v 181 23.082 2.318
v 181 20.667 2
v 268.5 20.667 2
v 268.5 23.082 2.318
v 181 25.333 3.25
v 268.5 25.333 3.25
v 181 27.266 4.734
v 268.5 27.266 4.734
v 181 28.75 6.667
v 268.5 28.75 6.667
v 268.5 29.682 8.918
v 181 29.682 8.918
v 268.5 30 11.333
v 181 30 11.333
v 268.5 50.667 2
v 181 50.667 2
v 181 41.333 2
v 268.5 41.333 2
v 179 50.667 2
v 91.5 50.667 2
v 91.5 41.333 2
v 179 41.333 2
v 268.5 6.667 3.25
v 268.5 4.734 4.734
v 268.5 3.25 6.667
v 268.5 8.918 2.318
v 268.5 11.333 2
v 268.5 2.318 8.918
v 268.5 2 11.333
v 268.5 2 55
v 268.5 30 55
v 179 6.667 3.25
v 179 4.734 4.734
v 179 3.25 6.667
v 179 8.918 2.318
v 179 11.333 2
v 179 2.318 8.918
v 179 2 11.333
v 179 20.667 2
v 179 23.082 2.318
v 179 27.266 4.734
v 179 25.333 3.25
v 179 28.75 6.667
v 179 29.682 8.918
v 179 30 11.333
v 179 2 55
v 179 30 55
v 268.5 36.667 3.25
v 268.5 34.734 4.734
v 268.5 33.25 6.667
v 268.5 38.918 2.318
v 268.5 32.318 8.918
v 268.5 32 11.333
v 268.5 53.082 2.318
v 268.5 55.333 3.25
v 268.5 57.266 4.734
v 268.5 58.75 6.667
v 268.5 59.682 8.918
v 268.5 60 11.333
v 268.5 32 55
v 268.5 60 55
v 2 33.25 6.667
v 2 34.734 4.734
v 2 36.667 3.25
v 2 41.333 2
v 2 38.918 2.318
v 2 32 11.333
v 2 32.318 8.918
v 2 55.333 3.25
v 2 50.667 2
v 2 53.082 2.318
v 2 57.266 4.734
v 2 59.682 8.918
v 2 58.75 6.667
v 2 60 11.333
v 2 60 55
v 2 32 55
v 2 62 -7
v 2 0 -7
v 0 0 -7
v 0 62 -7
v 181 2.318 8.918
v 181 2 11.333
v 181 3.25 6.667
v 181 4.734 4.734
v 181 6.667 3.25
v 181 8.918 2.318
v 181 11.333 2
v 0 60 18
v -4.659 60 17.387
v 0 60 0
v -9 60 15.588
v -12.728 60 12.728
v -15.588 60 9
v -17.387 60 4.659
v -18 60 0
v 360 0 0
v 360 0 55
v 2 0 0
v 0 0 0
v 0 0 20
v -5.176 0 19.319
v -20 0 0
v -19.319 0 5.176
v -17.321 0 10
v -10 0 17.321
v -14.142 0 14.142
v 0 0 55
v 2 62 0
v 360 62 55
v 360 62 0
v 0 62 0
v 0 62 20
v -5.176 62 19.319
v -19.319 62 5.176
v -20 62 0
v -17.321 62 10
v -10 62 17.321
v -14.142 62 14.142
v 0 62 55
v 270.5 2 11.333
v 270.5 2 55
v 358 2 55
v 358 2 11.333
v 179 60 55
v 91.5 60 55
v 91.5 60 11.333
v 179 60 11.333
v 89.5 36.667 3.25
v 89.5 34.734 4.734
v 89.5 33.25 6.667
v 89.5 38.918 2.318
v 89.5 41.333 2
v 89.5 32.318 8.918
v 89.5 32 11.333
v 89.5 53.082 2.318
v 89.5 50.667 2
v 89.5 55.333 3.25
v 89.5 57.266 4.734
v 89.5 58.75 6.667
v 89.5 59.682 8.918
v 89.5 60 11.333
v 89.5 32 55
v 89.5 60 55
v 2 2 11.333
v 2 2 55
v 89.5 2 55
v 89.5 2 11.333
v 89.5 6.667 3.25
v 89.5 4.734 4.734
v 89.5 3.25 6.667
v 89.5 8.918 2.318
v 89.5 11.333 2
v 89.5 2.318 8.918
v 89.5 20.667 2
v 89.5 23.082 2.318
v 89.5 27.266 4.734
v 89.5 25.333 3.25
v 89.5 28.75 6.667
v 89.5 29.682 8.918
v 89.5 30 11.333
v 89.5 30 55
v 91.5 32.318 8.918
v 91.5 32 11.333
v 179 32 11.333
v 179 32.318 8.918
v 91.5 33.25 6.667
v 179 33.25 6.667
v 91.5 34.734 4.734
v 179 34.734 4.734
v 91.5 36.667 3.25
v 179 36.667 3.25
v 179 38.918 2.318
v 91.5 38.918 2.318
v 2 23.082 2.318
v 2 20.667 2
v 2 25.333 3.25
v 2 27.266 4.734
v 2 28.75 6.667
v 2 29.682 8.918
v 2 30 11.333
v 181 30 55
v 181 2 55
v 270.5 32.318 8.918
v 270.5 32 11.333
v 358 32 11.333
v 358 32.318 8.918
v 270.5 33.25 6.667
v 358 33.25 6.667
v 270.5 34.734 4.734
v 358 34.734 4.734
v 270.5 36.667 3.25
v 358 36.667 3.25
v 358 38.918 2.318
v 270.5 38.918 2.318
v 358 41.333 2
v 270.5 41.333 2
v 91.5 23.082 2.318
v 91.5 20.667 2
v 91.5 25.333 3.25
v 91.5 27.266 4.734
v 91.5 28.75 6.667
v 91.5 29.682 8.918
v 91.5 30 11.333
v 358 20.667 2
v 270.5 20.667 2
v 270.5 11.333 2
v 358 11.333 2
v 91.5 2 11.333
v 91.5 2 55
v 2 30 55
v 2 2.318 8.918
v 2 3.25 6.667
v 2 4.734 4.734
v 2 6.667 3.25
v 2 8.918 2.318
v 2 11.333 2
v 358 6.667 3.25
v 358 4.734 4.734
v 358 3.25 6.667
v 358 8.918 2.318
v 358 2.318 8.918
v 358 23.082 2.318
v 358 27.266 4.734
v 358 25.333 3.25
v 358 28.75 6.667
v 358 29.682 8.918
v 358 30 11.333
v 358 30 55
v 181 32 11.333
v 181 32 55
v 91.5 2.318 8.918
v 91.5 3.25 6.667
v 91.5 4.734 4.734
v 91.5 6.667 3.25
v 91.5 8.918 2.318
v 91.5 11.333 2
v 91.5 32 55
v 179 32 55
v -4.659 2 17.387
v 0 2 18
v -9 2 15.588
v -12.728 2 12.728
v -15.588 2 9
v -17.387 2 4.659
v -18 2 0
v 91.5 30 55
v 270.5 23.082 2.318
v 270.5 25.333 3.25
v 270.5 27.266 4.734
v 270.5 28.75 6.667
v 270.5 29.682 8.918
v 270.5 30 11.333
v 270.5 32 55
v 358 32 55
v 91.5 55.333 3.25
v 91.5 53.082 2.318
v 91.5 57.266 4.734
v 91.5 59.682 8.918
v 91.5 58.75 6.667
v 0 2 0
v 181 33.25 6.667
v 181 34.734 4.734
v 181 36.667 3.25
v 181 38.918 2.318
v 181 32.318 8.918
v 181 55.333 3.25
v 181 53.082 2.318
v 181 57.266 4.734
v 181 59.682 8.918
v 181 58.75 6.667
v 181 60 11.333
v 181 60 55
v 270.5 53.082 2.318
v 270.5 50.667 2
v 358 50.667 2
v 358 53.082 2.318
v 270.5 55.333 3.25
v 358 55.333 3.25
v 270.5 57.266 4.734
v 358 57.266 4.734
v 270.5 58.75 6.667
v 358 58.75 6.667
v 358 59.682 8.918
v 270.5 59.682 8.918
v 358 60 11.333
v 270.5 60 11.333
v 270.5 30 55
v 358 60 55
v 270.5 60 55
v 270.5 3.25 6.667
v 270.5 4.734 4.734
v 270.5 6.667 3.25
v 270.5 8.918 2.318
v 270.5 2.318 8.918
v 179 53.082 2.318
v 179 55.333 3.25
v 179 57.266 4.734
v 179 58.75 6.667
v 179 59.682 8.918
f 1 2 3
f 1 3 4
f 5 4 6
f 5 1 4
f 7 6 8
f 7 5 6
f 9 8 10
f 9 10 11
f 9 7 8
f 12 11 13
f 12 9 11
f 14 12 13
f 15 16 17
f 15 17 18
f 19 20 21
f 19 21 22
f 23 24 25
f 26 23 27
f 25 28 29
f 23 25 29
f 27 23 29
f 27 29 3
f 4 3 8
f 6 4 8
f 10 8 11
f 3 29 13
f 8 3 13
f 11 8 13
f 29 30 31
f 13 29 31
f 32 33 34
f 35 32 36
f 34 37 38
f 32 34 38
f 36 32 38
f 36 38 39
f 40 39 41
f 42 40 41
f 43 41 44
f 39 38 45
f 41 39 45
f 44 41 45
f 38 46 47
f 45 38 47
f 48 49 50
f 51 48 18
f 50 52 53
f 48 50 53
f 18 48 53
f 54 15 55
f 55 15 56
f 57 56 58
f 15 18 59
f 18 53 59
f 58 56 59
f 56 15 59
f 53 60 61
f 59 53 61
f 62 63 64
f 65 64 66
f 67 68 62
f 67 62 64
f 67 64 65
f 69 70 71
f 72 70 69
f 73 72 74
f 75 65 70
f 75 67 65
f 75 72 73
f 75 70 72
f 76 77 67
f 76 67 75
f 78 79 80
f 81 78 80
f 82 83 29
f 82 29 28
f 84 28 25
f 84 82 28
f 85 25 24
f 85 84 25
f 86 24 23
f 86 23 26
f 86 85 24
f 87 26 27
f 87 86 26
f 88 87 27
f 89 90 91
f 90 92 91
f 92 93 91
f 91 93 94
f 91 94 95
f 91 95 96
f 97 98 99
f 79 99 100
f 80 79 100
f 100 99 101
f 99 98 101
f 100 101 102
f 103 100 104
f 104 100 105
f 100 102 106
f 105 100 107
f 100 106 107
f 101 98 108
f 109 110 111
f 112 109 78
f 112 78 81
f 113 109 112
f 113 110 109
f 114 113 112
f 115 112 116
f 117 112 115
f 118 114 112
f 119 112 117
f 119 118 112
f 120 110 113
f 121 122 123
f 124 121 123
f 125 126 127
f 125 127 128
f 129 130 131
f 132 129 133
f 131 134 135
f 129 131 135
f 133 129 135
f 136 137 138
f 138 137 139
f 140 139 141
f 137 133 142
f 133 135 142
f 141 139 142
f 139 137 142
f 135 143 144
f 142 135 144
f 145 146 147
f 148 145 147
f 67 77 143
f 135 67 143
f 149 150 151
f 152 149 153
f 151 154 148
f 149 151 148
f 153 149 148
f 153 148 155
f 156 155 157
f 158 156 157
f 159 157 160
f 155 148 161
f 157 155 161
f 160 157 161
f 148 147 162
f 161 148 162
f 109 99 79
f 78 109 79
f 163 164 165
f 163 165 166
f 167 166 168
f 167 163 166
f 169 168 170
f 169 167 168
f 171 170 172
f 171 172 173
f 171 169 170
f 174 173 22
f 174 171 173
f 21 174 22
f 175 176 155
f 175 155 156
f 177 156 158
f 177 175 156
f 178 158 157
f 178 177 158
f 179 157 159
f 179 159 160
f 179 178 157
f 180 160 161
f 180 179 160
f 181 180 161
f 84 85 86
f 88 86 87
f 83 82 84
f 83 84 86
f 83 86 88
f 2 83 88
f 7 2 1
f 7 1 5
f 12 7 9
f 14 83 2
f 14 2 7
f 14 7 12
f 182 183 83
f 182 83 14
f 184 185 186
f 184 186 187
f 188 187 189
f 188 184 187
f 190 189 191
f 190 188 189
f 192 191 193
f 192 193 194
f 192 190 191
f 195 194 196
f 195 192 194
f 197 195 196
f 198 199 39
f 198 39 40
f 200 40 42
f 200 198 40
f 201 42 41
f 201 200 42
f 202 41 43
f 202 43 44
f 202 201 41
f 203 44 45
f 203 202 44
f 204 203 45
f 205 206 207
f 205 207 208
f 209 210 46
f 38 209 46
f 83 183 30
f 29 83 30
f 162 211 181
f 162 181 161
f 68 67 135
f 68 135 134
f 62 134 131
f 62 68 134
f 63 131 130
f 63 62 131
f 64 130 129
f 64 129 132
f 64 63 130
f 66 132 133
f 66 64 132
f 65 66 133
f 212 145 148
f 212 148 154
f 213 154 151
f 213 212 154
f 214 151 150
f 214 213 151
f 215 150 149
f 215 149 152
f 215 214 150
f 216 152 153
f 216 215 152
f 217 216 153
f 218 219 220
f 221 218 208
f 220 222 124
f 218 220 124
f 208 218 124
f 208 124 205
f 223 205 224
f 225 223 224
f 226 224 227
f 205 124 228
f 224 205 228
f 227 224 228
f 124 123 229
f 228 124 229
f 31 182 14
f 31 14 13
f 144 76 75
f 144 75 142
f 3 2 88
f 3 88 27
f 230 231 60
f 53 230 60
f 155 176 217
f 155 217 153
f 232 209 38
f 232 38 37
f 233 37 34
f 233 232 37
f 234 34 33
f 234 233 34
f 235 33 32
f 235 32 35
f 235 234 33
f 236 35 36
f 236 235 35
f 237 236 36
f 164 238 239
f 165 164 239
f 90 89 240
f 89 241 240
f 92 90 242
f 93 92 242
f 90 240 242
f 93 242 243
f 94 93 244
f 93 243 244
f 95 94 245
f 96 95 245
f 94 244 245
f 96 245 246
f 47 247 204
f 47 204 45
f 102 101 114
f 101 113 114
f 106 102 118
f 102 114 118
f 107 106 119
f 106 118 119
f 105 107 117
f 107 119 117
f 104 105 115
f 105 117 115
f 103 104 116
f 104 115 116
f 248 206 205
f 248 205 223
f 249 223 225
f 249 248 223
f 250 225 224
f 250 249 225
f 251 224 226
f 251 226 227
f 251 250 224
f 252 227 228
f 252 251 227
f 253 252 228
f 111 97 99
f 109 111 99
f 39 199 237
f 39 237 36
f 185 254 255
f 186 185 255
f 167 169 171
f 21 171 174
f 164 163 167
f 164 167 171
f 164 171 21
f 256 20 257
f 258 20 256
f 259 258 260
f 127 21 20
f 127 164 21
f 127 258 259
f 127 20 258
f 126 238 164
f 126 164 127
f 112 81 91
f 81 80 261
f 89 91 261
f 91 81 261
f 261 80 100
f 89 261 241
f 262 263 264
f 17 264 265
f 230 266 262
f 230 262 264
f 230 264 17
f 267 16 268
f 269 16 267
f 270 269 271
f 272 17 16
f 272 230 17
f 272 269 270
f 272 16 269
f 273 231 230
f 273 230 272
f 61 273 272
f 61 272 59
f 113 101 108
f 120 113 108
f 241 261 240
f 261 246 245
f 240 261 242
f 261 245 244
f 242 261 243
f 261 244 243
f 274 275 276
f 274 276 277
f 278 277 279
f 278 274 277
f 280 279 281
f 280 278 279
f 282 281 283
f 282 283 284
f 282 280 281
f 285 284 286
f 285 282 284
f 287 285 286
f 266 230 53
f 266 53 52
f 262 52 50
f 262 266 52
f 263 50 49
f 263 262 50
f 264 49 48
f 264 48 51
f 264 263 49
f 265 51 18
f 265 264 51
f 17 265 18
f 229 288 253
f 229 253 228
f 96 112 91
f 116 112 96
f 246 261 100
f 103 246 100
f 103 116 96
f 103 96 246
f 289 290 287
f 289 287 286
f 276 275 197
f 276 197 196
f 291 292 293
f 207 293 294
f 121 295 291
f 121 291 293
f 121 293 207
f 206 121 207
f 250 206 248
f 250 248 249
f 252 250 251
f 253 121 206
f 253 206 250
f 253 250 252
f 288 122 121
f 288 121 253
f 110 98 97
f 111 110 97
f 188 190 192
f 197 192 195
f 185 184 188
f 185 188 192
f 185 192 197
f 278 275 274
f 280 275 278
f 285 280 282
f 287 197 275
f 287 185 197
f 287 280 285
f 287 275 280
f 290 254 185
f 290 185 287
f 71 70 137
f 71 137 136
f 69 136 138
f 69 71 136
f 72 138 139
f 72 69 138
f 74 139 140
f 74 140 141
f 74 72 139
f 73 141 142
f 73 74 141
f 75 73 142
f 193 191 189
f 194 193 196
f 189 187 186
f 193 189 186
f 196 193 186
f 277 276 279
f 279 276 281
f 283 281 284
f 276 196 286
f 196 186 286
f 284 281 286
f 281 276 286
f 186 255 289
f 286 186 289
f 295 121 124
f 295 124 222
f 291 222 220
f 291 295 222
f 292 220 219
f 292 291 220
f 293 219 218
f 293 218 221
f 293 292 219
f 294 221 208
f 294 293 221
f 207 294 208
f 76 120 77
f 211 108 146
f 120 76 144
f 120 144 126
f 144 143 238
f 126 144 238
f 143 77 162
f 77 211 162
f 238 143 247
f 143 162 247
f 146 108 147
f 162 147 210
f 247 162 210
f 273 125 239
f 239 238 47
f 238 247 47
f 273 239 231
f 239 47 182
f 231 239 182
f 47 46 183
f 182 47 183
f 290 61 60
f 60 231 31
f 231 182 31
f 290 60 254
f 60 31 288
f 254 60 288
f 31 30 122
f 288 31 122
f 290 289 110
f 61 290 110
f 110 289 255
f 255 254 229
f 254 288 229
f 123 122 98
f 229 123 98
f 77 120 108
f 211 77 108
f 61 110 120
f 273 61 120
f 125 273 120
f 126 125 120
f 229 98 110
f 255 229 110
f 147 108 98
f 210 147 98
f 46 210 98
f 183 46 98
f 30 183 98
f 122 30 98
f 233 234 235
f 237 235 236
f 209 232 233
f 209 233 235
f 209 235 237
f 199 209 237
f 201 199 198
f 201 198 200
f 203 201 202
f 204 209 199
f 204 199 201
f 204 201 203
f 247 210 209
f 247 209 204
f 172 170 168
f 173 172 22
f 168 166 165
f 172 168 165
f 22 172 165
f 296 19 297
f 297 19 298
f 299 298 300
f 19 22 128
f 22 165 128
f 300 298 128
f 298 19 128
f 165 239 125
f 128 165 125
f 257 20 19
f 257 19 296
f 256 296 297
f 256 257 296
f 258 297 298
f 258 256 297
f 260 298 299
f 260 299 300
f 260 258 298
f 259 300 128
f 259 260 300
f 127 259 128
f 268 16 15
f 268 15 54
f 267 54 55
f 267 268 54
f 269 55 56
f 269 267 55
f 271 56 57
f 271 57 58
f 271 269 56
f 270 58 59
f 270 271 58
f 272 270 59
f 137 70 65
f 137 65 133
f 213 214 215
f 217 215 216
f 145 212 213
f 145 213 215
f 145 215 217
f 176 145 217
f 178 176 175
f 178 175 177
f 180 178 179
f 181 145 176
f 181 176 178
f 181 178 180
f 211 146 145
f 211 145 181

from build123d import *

# Parameters (mm, degrees)
PAD002_DEPTH                    = 62
SKETCH004_W                     = 87.5
SKETCH004_H                     = 28
POCKET001_DEPTH                 = 53
PAD_DEPTH                       = 87.5
SKETCH004_LINEARPATTERN_2_W     = 87.5
SKETCH004_LINEARPATTERN_2_H     = 28
POCKET001_LINEARPATTERN_2_DEPTH = 53
PAD_LINEARPATTERN_2_DEPTH       = 87.5
SKETCH004_LINEARPATTERN_3_W     = 87.5
SKETCH004_LINEARPATTERN_3_H     = 28
POCKET001_LINEARPATTERN_3_DEPTH = 53
PAD_LINEARPATTERN_3_DEPTH       = 87.5
SKETCH004_LINEARPATTERN_4_W     = 87.5
SKETCH004_LINEARPATTERN_4_H     = 28
POCKET001_LINEARPATTERN_4_DEPTH = 53
PAD_LINEARPATTERN_4_DEPTH       = 87.5
LINEARPATTERN001_COUNT          = 2
LINEARPATTERN001_PITCH          = 30
REVOLUTION_ANGLE                = -90


with BuildPart() as part:
    # Sketch006 → Pad002 (new body)
    with BuildSketch(Plane.XZ):
        Polygon((0, 55), (360, 55), (360, 0), (2, 0), (2, -7), (0, -7), align=None)
    extrude(amount=-PAD002_DEPTH)

    # Sketch004 (on DatumPlane) → Pocket001 (cut)
    with BuildSketch(Plane.XY.offset(55)):
        with Locations((45.75, 16)):
            Rectangle(SKETCH004_W, SKETCH004_H)
    pocket001 = extrude(amount=-POCKET001_DEPTH, mode=Mode.SUBTRACT)

    # Sketch (on DatumPlane) → Pad (join)
    with BuildSketch(Plane.YZ.offset(2)):
        with BuildLine():
            ThreePointArc((2, 11.333333), (4.73367, 4.73367), (11.333333, 2))
            Line((2, 2), (11.333333, 2))
            Line((2, 11.333333), (2, 2))
        make_face()
        with BuildLine():
            ThreePointArc((20.666667, 2), (27.26633, 4.73367), (30, 11.333333))
            Line((30, 2), (30, 11.333333))
            Line((20.666667, 2), (30, 2))
        make_face()
    pad = extrude(amount=PAD_DEPTH)

    # Sketch004 LinearPattern 2 → Pocket001 LinearPattern 2 (cut)
    with BuildSketch(Plane(origin=(89.5, 0, 55), x_dir=(1, 0, 0), z_dir=(0, 0, 1))):
        with Locations((45.75, 16)):
            Rectangle(SKETCH004_LINEARPATTERN_2_W, SKETCH004_LINEARPATTERN_2_H)
    pocket001_linearpattern_2 = extrude(amount=-POCKET001_LINEARPATTERN_2_DEPTH, mode=Mode.SUBTRACT)

    # Sketch LinearPattern 2 → Pad LinearPattern 2 (add)
    with BuildSketch(Plane.YZ.offset(91.5)):
        with BuildLine():
            ThreePointArc((2, 11.333333), (4.73367, 4.73367), (11.333333, 2))
            Line((2, 2), (11.333333, 2))
            Line((2, 11.333333), (2, 2))
        make_face()
        with BuildLine():
            ThreePointArc((20.666667, 2), (27.26633, 4.73367), (30, 11.333333))
            Line((30, 2), (30, 11.333333))
            Line((20.666667, 2), (30, 2))
        make_face()
    pad_linearpattern_2 = extrude(amount=PAD_LINEARPATTERN_2_DEPTH)

    # Sketch004 LinearPattern 3 → Pocket001 LinearPattern 3 (cut)
    with BuildSketch(Plane(origin=(179, 0, 55), x_dir=(1, 0, 0), z_dir=(0, 0, 1))):
        with Locations((45.75, 16)):
            Rectangle(SKETCH004_LINEARPATTERN_3_W, SKETCH004_LINEARPATTERN_3_H)
    pocket001_linearpattern_3 = extrude(amount=-POCKET001_LINEARPATTERN_3_DEPTH, mode=Mode.SUBTRACT)

    # Sketch LinearPattern 3 → Pad LinearPattern 3 (add)
    with BuildSketch(Plane.YZ.offset(181)):
        with BuildLine():
            ThreePointArc((2, 11.333333), (4.73367, 4.73367), (11.333333, 2))
            Line((2, 2), (11.333333, 2))
            Line((2, 11.333333), (2, 2))
        make_face()
        with BuildLine():
            ThreePointArc((20.666667, 2), (27.26633, 4.73367), (30, 11.333333))
            Line((30, 2), (30, 11.333333))
            Line((20.666667, 2), (30, 2))
        make_face()
    pad_linearpattern_3 = extrude(amount=PAD_LINEARPATTERN_3_DEPTH)

    # Sketch004 LinearPattern 4 → Pocket001 LinearPattern 4 (cut)
    with BuildSketch(Plane(origin=(268.5, 0, 55), x_dir=(1, 0, 0), z_dir=(0, 0, 1))):
        with Locations((45.75, 16)):
            Rectangle(SKETCH004_LINEARPATTERN_4_W, SKETCH004_LINEARPATTERN_4_H)
    pocket001_linearpattern_4 = extrude(amount=-POCKET001_LINEARPATTERN_4_DEPTH, mode=Mode.SUBTRACT)

    # Sketch LinearPattern 4 → Pad LinearPattern 4 (add)
    with BuildSketch(Plane.YZ.offset(270.5)):
        with BuildLine():
            ThreePointArc((2, 11.333333), (4.73367, 4.73367), (11.333333, 2))
            Line((2, 2), (11.333333, 2))
            Line((2, 11.333333), (2, 2))
        make_face()
        with BuildLine():
            ThreePointArc((20.666667, 2), (27.26633, 4.73367), (30, 11.333333))
            Line((30, 2), (30, 11.333333))
            Line((20.666667, 2), (30, 2))
        make_face()
    pad_linearpattern_4 = extrude(amount=PAD_LINEARPATTERN_4_DEPTH)

    # LinearPattern001: Pocket001, Pad, Pocket001 LinearPattern 2, Pad LinearPattern 2, Pocket001 LinearPattern 3, Pad LinearPattern 3, Pocket001 LinearPattern 4, Pad LinearPattern 4 ×2
    with Locations(*[(0, i * LINEARPATTERN001_PITCH, 0) for i in range(1, LINEARPATTERN001_COUNT)]):
        add(pocket001, mode=Mode.SUBTRACT)
        add(pad)
        add(pocket001_linearpattern_2, mode=Mode.SUBTRACT)
        add(pad_linearpattern_2)
        add(pocket001_linearpattern_3, mode=Mode.SUBTRACT)
        add(pad_linearpattern_3)
        add(pocket001_linearpattern_4, mode=Mode.SUBTRACT)
        add(pad_linearpattern_4)

    # Sketch007 → Revolution (revolve)
    with BuildSketch(Plane.YZ):
        Polygon((0, 0), (0, 20), (62, 20), (62, 0), (60, 0), (60, 18), (2, 18), (2, 0), align=None)
    revolve(axis=Axis((0, 0, 0), (0, 1, 0)), revolution_arc=REVOLUTION_ANGLE)


solid = part.part
